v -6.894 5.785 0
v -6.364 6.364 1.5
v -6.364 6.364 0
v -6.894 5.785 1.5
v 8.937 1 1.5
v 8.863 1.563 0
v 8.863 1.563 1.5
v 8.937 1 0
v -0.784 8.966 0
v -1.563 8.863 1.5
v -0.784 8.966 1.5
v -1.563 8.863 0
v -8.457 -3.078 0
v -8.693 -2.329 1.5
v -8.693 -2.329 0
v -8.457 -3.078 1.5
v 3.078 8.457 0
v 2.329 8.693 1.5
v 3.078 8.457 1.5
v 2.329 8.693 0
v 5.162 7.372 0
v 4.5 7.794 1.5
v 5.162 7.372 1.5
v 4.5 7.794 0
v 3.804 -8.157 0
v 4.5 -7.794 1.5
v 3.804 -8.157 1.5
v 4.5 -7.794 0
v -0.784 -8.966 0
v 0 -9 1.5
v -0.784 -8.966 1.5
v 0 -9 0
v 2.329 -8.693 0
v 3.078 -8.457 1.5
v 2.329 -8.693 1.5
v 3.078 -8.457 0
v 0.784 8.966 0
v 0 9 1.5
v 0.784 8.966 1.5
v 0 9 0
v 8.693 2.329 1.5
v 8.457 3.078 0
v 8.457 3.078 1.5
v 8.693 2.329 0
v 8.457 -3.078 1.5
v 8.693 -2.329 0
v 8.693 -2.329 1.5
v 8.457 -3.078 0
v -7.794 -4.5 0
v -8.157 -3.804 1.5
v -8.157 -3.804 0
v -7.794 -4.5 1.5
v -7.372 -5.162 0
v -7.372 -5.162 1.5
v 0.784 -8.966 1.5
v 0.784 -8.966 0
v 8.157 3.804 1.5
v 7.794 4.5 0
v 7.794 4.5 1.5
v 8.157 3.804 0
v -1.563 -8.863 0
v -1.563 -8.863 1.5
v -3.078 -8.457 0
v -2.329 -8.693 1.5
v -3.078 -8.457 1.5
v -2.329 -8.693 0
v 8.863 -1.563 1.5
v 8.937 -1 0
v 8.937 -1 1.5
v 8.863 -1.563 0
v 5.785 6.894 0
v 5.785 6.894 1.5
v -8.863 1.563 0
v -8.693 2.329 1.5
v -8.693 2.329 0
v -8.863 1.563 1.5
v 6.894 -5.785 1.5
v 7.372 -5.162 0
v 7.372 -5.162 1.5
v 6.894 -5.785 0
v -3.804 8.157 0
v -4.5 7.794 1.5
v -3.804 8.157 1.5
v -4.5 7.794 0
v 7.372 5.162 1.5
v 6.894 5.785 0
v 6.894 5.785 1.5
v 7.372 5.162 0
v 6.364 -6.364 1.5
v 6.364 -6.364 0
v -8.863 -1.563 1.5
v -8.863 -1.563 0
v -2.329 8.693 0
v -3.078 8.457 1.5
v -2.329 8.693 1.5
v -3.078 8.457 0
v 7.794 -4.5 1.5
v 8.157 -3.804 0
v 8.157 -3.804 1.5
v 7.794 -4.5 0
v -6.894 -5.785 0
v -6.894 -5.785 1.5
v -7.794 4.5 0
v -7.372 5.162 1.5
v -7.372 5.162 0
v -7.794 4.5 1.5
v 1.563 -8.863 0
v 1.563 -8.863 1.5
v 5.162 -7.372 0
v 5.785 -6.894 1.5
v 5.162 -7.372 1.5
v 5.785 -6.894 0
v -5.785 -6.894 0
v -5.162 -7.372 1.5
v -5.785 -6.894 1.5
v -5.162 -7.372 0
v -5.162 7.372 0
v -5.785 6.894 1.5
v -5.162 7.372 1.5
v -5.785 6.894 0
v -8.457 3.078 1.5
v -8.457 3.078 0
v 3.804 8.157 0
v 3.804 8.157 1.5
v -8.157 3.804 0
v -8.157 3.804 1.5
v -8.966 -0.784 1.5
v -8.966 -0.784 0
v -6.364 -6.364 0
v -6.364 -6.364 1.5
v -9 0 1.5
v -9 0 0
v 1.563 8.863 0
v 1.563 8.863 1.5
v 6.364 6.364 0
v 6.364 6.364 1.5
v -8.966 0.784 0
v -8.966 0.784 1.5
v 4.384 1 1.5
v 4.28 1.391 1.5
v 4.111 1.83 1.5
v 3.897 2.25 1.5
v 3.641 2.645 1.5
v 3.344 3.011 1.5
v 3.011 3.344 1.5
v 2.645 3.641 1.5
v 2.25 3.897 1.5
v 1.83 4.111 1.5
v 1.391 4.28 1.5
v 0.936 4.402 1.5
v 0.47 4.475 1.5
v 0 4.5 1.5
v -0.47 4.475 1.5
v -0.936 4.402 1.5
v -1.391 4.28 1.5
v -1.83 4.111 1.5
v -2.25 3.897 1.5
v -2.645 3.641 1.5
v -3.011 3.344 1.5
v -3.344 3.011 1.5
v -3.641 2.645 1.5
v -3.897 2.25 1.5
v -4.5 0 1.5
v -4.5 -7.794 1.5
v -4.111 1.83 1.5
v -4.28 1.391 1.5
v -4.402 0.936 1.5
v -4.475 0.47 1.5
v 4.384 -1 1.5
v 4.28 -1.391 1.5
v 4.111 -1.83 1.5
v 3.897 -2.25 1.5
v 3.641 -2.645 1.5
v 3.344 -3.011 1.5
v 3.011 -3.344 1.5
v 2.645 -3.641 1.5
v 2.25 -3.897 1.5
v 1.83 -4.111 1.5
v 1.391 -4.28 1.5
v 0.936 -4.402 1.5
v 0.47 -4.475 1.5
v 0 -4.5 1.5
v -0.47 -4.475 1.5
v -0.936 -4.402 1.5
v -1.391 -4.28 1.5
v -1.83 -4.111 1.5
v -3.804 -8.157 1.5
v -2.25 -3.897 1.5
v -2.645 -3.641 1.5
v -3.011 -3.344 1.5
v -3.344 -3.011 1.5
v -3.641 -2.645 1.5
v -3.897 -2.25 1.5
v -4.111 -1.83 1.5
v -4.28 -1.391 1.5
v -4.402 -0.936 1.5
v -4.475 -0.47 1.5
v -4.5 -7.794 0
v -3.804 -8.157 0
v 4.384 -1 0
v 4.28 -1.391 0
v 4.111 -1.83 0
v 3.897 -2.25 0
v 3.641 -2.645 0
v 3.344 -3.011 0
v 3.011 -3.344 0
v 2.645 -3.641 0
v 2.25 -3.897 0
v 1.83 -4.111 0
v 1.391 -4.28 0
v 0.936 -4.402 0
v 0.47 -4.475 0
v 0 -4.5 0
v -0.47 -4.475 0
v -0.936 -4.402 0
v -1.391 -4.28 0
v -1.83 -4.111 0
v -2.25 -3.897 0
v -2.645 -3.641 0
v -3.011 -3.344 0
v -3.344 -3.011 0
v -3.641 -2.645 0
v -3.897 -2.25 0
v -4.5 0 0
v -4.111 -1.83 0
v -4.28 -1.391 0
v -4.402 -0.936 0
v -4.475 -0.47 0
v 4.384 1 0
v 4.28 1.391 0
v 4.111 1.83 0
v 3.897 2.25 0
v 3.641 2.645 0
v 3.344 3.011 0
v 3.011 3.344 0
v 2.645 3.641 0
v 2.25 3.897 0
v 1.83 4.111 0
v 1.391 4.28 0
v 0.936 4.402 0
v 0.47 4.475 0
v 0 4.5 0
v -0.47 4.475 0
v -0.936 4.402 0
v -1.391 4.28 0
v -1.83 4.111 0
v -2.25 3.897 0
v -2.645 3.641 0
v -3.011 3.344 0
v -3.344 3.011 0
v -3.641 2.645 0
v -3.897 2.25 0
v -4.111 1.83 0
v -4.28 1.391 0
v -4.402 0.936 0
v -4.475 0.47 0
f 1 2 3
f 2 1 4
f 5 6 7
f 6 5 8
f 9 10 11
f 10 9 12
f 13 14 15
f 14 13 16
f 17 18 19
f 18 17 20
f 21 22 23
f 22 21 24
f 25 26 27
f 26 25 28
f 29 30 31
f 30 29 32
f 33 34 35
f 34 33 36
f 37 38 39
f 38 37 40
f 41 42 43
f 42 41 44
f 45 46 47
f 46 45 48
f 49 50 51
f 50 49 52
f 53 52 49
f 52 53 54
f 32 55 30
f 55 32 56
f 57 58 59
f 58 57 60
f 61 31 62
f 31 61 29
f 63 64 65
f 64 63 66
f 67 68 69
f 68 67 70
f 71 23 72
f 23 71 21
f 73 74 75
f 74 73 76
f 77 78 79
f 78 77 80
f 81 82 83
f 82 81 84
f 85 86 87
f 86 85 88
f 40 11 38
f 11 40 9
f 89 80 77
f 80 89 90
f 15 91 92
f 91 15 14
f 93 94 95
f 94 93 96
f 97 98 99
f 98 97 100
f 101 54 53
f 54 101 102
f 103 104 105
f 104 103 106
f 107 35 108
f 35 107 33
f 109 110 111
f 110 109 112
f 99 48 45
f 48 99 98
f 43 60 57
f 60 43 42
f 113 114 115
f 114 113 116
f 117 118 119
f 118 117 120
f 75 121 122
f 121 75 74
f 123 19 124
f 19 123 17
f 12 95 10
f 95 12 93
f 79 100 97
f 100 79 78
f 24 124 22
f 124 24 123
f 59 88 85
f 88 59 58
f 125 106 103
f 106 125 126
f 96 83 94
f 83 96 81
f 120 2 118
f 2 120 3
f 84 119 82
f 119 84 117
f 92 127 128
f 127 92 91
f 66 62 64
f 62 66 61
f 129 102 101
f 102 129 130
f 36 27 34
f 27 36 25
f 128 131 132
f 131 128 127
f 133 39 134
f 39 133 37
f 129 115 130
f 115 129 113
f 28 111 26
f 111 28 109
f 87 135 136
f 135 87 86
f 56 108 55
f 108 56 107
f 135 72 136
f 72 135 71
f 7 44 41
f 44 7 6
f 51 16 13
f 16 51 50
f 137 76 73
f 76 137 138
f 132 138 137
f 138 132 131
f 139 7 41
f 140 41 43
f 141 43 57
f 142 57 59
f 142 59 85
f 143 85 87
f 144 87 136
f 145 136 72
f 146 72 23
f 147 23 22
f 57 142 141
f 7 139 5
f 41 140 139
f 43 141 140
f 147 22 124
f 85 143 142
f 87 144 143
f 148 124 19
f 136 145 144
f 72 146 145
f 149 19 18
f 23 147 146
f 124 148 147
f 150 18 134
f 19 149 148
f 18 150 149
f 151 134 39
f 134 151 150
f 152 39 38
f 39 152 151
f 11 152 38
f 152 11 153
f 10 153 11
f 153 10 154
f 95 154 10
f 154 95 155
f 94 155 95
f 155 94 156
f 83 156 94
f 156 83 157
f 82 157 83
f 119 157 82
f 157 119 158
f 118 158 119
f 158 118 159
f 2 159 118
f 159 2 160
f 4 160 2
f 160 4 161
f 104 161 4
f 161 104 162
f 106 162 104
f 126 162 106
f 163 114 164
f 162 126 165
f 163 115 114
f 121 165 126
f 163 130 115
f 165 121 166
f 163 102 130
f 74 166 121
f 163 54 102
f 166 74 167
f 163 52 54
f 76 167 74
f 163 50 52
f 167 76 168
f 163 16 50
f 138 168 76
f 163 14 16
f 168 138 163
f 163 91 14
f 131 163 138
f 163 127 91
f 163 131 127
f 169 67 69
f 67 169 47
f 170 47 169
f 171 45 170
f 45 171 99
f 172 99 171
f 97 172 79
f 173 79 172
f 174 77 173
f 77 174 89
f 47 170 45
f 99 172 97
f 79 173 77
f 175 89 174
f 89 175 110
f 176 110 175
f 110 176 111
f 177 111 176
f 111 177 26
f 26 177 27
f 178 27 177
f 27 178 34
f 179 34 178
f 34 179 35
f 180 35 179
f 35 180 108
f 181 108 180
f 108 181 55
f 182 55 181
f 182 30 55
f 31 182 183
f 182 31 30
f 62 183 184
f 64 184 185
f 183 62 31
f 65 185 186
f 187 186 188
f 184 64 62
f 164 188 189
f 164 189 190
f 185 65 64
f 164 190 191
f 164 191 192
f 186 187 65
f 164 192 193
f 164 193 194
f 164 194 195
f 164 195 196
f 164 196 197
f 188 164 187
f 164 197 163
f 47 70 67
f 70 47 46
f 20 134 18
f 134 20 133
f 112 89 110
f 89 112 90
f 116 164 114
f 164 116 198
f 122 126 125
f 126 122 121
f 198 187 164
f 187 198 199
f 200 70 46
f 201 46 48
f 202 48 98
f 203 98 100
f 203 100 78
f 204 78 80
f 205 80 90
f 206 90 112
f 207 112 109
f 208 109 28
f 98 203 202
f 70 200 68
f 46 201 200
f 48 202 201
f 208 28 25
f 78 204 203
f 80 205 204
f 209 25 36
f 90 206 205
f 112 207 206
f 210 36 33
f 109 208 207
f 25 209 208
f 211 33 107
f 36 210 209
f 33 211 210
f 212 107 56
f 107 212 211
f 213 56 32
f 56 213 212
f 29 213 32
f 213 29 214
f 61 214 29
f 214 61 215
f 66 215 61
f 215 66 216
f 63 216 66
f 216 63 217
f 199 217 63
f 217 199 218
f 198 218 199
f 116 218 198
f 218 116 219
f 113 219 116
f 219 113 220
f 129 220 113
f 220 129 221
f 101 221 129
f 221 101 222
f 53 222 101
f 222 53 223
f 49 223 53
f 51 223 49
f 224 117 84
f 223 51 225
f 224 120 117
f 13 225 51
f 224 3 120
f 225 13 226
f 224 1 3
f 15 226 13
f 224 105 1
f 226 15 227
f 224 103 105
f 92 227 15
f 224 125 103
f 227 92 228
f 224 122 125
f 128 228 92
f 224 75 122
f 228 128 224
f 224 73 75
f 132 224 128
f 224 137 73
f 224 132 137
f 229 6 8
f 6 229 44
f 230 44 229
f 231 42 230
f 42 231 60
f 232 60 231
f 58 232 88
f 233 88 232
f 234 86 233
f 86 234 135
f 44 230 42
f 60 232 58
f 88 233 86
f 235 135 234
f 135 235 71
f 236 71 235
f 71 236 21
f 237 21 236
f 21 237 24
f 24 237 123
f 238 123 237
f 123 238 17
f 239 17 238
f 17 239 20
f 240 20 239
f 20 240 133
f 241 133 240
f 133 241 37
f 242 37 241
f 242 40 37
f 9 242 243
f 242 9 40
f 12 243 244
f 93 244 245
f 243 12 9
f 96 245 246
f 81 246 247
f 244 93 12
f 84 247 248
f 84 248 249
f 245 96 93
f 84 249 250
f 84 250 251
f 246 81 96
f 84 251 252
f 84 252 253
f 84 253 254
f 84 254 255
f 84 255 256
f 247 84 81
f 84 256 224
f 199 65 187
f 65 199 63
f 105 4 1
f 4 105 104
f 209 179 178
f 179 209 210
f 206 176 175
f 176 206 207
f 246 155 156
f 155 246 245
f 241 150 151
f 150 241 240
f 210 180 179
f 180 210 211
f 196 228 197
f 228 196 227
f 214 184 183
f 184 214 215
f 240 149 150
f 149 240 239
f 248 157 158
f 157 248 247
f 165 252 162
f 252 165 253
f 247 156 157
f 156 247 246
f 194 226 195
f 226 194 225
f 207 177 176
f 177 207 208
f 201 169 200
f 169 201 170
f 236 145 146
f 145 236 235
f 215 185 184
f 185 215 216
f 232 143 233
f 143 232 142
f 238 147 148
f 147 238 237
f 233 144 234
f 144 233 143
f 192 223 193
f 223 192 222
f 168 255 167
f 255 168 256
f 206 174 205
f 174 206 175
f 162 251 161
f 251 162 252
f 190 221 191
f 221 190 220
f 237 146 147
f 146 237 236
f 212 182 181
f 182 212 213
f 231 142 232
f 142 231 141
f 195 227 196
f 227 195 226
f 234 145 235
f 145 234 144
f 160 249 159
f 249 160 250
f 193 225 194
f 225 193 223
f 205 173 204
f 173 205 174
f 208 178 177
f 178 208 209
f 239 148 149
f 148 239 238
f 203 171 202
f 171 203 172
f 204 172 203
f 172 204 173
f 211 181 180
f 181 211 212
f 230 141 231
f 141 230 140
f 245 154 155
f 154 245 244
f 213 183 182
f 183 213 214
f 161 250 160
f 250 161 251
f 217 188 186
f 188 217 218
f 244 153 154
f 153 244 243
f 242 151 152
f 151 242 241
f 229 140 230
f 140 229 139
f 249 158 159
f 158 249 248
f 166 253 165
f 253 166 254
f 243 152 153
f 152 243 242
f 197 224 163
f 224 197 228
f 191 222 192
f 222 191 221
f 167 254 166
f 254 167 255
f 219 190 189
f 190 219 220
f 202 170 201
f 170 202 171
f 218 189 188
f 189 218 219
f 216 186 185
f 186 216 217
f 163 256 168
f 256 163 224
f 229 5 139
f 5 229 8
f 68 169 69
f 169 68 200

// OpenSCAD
// part_id: a11
// name: A11 gear lock (b1 Gear Lock)
// source_drawing_ids: DRW-001
// units: mm
// revision: 0.1-placeholder
// SPDX-License-Identifier: MIT
//
// Lock ring that secures b1 on the central axle.
// Geometry is approximate – no dedicated detail drawing available.

module part_a11(od = 18.0, id = 9.0, th = 1.5, gap_w = 2.0) {
    difference() {
        cylinder(d = od, h = th, center = false, $fn = 72);
        translate([0, 0, -0.1]) cylinder(d = id, h = th + 0.2, center = false, $fn = 60);
        // Split gap (c-clip style).
        translate([0, -gap_w / 2, -0.1]) cube([od / 2 + 1, gap_w, th + 0.2], center = false);
    }
}


// ---- "main guard" ----
if (is_undef(__LIB_MODE__)) {
    part_a11();
}
